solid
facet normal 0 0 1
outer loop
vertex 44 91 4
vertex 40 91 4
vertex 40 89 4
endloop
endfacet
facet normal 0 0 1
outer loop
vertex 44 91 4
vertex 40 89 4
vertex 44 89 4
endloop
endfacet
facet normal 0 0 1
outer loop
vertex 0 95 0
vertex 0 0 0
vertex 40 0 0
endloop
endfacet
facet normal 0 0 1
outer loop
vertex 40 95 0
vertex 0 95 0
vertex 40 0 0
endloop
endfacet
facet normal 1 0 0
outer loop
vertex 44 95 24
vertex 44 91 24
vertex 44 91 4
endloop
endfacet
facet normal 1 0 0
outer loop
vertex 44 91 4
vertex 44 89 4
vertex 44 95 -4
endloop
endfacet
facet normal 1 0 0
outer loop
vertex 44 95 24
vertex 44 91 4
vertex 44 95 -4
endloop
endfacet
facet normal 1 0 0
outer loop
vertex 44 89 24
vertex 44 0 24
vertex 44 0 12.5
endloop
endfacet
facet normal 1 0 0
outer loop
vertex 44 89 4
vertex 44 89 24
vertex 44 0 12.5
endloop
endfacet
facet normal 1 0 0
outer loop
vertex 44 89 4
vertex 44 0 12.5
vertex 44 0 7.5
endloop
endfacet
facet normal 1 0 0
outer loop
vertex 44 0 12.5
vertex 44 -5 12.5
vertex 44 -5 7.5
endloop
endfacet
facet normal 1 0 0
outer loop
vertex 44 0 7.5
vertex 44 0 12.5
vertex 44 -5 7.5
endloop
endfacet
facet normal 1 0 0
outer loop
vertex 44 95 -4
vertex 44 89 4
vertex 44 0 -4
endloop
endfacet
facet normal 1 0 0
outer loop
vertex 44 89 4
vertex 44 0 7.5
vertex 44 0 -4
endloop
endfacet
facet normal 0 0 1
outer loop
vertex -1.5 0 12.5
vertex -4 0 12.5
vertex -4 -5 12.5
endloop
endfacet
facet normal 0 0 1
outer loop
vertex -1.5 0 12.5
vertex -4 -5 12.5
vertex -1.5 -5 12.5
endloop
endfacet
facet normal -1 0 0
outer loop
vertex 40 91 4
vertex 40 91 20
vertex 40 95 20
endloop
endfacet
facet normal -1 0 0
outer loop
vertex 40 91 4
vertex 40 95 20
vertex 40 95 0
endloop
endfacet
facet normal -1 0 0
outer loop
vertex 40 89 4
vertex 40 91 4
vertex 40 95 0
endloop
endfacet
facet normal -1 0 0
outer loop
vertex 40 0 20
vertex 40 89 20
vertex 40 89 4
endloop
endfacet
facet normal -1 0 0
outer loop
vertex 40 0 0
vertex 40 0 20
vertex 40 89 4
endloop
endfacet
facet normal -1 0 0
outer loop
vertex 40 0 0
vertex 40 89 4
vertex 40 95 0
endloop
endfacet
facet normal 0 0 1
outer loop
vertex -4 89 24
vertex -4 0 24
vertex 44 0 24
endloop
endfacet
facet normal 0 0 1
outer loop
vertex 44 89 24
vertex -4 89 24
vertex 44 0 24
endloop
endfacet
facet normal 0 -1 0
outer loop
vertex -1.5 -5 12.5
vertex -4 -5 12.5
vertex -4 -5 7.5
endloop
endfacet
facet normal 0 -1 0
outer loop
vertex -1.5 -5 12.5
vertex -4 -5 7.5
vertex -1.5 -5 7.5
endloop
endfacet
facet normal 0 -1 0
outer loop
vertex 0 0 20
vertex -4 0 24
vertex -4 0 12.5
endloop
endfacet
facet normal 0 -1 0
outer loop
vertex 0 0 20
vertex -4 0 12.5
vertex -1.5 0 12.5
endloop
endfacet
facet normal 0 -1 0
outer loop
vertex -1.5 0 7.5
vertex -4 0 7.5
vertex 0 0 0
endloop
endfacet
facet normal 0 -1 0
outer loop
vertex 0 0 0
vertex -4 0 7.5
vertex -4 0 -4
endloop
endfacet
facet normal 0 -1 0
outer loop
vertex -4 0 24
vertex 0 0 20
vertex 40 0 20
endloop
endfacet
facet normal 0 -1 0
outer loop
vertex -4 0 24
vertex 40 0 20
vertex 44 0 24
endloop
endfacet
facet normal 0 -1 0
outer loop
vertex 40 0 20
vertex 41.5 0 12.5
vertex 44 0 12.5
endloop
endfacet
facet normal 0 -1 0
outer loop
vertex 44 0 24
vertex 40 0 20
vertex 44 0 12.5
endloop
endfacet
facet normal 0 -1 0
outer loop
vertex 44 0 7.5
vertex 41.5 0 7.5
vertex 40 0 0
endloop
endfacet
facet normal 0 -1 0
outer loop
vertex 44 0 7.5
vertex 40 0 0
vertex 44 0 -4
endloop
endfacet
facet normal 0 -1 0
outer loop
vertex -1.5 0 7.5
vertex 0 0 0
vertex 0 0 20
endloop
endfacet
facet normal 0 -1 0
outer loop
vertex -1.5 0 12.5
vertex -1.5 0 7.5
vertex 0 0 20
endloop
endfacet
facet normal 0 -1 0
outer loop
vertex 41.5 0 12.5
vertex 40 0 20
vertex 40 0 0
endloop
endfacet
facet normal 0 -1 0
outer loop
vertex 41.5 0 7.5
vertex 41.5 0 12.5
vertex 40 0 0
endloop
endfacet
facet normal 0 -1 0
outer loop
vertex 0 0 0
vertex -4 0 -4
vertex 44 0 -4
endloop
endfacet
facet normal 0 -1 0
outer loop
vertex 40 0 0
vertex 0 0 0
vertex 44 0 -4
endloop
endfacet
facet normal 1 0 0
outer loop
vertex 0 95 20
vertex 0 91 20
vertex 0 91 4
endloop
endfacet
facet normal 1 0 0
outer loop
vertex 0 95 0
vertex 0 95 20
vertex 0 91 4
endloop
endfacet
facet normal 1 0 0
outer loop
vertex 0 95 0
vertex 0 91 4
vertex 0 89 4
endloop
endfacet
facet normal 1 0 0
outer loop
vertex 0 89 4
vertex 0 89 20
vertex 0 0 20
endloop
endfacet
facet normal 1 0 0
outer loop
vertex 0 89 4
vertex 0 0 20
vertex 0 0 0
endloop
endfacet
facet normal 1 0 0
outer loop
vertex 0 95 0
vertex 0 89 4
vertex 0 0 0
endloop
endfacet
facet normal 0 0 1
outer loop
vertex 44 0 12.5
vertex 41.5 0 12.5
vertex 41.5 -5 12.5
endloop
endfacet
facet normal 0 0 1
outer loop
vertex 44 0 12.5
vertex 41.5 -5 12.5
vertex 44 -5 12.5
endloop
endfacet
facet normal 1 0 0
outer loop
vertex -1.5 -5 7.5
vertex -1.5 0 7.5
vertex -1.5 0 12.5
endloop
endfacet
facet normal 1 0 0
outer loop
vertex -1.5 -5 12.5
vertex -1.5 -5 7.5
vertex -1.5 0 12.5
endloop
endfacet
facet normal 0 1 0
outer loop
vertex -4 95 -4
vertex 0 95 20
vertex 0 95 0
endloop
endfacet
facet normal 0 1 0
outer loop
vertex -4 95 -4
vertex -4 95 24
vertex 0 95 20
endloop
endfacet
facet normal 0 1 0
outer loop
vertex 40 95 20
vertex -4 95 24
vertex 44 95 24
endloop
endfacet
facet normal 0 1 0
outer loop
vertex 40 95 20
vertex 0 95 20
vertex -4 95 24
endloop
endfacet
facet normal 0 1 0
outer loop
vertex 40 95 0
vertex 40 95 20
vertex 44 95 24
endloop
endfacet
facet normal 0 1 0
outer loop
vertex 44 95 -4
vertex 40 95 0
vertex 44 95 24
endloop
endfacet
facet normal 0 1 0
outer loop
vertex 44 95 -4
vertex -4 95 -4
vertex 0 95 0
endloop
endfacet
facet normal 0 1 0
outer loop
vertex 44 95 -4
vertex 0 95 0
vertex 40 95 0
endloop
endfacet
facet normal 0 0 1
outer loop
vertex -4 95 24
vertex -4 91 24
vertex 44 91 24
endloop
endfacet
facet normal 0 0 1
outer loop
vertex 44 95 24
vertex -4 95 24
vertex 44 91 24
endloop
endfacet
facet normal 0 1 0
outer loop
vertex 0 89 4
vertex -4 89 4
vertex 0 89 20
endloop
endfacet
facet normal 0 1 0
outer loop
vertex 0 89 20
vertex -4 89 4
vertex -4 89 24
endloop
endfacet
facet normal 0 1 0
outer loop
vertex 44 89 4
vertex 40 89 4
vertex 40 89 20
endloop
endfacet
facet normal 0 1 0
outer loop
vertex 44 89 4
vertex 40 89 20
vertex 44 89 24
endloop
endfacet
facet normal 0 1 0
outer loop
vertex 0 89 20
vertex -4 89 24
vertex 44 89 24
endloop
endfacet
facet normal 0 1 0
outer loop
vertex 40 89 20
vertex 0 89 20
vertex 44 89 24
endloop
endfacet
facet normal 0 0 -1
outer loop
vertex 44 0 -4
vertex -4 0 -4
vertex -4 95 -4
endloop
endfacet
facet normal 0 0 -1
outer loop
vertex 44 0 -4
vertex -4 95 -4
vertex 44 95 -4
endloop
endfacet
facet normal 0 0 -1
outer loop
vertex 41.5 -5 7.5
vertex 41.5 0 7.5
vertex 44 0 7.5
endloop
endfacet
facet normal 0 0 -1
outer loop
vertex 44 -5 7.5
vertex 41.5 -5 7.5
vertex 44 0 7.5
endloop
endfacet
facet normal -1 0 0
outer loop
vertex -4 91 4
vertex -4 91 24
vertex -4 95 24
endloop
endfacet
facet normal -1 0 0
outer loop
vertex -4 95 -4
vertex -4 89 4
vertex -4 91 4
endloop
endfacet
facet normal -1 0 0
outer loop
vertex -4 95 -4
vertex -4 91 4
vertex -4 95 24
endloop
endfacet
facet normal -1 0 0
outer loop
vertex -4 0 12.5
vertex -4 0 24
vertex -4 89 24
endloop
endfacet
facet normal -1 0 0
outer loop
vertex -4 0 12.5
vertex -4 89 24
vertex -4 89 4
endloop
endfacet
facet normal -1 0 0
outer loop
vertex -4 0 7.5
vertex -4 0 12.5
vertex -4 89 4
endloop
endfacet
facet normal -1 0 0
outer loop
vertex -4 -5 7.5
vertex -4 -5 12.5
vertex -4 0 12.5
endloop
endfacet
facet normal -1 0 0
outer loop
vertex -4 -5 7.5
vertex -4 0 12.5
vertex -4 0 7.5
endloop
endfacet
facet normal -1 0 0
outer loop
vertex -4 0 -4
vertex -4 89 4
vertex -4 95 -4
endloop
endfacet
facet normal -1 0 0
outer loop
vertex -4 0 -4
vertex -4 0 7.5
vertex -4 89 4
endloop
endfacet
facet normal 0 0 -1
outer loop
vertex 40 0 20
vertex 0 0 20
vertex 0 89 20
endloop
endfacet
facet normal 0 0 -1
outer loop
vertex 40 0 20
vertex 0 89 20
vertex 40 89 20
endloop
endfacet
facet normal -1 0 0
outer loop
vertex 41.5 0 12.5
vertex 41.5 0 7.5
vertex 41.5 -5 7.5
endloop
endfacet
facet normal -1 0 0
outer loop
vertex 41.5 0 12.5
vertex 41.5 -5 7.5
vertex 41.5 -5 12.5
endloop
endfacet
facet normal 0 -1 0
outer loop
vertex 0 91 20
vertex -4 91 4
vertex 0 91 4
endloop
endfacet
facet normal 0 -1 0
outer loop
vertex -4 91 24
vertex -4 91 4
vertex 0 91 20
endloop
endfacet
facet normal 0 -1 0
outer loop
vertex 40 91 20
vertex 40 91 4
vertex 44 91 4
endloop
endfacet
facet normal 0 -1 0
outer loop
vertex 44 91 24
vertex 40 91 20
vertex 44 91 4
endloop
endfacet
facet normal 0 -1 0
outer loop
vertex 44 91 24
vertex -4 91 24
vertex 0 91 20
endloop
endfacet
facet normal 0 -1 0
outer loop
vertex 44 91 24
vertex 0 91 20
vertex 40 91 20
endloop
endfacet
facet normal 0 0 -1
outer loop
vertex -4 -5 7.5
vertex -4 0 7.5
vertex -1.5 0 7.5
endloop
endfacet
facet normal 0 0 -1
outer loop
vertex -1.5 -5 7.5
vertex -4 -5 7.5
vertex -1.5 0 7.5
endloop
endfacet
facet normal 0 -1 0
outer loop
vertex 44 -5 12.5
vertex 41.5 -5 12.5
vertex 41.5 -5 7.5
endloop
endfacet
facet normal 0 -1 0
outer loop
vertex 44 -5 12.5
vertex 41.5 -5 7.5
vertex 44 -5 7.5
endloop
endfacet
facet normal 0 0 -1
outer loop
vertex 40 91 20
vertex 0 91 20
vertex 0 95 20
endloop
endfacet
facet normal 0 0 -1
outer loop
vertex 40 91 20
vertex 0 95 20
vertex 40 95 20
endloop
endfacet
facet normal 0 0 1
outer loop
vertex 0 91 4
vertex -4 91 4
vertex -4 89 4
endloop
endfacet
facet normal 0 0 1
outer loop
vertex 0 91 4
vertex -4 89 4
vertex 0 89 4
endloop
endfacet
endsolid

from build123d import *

# Parameters (mm, degrees)
SKETCH1_W           = 48
SKETCH1_H           = 28
SKETCH1_W_2         = 40
SKETCH1_H_2         = 20
BOSS_EXTRUDE1_DEPTH = 95
SKETCH6_W           = 2.5
SKETCH6_H           = 5
BOSS_EXTRUDE3_DEPTH = 5
SKETCH7_W           = 55.319039298
SKETCH7_H           = 2
CUT_EXTRUDE1_DEPTH  = 20


with BuildPart() as part:
    # Sketch1 → Boss-Extrude1 (new body)
    with BuildSketch(Plane(origin=(0, 0, 0), x_dir=(1, 0, 0), z_dir=(0, 1, 0))):
        with Locations((20, -10)):
            Rectangle(SKETCH1_W, SKETCH1_H)
        with Locations((20, -10)):
            Rectangle(SKETCH1_W_2, SKETCH1_H_2, mode=Mode.SUBTRACT)
    extrude(amount=BOSS_EXTRUDE1_DEPTH)

    # Sketch6 → Boss-Extrude3 (add)
    with BuildSketch(Plane.XZ):
        with Locations((-2.75, 10)):
            Rectangle(SKETCH6_W, SKETCH6_H)
        with Locations((42.75, 10)):
            Rectangle(SKETCH6_W, SKETCH6_H)
    extrude(amount=BOSS_EXTRUDE3_DEPTH)

    # Sketch7 → Cut-Extrude1 (cut)
    with BuildSketch(Plane.XY.offset(24)):
        with Locations((21.062221668, 90)):
            Rectangle(SKETCH7_W, SKETCH7_H)
    extrude(amount=-CUT_EXTRUDE1_DEPTH, mode=Mode.SUBTRACT)


solid = part.part
